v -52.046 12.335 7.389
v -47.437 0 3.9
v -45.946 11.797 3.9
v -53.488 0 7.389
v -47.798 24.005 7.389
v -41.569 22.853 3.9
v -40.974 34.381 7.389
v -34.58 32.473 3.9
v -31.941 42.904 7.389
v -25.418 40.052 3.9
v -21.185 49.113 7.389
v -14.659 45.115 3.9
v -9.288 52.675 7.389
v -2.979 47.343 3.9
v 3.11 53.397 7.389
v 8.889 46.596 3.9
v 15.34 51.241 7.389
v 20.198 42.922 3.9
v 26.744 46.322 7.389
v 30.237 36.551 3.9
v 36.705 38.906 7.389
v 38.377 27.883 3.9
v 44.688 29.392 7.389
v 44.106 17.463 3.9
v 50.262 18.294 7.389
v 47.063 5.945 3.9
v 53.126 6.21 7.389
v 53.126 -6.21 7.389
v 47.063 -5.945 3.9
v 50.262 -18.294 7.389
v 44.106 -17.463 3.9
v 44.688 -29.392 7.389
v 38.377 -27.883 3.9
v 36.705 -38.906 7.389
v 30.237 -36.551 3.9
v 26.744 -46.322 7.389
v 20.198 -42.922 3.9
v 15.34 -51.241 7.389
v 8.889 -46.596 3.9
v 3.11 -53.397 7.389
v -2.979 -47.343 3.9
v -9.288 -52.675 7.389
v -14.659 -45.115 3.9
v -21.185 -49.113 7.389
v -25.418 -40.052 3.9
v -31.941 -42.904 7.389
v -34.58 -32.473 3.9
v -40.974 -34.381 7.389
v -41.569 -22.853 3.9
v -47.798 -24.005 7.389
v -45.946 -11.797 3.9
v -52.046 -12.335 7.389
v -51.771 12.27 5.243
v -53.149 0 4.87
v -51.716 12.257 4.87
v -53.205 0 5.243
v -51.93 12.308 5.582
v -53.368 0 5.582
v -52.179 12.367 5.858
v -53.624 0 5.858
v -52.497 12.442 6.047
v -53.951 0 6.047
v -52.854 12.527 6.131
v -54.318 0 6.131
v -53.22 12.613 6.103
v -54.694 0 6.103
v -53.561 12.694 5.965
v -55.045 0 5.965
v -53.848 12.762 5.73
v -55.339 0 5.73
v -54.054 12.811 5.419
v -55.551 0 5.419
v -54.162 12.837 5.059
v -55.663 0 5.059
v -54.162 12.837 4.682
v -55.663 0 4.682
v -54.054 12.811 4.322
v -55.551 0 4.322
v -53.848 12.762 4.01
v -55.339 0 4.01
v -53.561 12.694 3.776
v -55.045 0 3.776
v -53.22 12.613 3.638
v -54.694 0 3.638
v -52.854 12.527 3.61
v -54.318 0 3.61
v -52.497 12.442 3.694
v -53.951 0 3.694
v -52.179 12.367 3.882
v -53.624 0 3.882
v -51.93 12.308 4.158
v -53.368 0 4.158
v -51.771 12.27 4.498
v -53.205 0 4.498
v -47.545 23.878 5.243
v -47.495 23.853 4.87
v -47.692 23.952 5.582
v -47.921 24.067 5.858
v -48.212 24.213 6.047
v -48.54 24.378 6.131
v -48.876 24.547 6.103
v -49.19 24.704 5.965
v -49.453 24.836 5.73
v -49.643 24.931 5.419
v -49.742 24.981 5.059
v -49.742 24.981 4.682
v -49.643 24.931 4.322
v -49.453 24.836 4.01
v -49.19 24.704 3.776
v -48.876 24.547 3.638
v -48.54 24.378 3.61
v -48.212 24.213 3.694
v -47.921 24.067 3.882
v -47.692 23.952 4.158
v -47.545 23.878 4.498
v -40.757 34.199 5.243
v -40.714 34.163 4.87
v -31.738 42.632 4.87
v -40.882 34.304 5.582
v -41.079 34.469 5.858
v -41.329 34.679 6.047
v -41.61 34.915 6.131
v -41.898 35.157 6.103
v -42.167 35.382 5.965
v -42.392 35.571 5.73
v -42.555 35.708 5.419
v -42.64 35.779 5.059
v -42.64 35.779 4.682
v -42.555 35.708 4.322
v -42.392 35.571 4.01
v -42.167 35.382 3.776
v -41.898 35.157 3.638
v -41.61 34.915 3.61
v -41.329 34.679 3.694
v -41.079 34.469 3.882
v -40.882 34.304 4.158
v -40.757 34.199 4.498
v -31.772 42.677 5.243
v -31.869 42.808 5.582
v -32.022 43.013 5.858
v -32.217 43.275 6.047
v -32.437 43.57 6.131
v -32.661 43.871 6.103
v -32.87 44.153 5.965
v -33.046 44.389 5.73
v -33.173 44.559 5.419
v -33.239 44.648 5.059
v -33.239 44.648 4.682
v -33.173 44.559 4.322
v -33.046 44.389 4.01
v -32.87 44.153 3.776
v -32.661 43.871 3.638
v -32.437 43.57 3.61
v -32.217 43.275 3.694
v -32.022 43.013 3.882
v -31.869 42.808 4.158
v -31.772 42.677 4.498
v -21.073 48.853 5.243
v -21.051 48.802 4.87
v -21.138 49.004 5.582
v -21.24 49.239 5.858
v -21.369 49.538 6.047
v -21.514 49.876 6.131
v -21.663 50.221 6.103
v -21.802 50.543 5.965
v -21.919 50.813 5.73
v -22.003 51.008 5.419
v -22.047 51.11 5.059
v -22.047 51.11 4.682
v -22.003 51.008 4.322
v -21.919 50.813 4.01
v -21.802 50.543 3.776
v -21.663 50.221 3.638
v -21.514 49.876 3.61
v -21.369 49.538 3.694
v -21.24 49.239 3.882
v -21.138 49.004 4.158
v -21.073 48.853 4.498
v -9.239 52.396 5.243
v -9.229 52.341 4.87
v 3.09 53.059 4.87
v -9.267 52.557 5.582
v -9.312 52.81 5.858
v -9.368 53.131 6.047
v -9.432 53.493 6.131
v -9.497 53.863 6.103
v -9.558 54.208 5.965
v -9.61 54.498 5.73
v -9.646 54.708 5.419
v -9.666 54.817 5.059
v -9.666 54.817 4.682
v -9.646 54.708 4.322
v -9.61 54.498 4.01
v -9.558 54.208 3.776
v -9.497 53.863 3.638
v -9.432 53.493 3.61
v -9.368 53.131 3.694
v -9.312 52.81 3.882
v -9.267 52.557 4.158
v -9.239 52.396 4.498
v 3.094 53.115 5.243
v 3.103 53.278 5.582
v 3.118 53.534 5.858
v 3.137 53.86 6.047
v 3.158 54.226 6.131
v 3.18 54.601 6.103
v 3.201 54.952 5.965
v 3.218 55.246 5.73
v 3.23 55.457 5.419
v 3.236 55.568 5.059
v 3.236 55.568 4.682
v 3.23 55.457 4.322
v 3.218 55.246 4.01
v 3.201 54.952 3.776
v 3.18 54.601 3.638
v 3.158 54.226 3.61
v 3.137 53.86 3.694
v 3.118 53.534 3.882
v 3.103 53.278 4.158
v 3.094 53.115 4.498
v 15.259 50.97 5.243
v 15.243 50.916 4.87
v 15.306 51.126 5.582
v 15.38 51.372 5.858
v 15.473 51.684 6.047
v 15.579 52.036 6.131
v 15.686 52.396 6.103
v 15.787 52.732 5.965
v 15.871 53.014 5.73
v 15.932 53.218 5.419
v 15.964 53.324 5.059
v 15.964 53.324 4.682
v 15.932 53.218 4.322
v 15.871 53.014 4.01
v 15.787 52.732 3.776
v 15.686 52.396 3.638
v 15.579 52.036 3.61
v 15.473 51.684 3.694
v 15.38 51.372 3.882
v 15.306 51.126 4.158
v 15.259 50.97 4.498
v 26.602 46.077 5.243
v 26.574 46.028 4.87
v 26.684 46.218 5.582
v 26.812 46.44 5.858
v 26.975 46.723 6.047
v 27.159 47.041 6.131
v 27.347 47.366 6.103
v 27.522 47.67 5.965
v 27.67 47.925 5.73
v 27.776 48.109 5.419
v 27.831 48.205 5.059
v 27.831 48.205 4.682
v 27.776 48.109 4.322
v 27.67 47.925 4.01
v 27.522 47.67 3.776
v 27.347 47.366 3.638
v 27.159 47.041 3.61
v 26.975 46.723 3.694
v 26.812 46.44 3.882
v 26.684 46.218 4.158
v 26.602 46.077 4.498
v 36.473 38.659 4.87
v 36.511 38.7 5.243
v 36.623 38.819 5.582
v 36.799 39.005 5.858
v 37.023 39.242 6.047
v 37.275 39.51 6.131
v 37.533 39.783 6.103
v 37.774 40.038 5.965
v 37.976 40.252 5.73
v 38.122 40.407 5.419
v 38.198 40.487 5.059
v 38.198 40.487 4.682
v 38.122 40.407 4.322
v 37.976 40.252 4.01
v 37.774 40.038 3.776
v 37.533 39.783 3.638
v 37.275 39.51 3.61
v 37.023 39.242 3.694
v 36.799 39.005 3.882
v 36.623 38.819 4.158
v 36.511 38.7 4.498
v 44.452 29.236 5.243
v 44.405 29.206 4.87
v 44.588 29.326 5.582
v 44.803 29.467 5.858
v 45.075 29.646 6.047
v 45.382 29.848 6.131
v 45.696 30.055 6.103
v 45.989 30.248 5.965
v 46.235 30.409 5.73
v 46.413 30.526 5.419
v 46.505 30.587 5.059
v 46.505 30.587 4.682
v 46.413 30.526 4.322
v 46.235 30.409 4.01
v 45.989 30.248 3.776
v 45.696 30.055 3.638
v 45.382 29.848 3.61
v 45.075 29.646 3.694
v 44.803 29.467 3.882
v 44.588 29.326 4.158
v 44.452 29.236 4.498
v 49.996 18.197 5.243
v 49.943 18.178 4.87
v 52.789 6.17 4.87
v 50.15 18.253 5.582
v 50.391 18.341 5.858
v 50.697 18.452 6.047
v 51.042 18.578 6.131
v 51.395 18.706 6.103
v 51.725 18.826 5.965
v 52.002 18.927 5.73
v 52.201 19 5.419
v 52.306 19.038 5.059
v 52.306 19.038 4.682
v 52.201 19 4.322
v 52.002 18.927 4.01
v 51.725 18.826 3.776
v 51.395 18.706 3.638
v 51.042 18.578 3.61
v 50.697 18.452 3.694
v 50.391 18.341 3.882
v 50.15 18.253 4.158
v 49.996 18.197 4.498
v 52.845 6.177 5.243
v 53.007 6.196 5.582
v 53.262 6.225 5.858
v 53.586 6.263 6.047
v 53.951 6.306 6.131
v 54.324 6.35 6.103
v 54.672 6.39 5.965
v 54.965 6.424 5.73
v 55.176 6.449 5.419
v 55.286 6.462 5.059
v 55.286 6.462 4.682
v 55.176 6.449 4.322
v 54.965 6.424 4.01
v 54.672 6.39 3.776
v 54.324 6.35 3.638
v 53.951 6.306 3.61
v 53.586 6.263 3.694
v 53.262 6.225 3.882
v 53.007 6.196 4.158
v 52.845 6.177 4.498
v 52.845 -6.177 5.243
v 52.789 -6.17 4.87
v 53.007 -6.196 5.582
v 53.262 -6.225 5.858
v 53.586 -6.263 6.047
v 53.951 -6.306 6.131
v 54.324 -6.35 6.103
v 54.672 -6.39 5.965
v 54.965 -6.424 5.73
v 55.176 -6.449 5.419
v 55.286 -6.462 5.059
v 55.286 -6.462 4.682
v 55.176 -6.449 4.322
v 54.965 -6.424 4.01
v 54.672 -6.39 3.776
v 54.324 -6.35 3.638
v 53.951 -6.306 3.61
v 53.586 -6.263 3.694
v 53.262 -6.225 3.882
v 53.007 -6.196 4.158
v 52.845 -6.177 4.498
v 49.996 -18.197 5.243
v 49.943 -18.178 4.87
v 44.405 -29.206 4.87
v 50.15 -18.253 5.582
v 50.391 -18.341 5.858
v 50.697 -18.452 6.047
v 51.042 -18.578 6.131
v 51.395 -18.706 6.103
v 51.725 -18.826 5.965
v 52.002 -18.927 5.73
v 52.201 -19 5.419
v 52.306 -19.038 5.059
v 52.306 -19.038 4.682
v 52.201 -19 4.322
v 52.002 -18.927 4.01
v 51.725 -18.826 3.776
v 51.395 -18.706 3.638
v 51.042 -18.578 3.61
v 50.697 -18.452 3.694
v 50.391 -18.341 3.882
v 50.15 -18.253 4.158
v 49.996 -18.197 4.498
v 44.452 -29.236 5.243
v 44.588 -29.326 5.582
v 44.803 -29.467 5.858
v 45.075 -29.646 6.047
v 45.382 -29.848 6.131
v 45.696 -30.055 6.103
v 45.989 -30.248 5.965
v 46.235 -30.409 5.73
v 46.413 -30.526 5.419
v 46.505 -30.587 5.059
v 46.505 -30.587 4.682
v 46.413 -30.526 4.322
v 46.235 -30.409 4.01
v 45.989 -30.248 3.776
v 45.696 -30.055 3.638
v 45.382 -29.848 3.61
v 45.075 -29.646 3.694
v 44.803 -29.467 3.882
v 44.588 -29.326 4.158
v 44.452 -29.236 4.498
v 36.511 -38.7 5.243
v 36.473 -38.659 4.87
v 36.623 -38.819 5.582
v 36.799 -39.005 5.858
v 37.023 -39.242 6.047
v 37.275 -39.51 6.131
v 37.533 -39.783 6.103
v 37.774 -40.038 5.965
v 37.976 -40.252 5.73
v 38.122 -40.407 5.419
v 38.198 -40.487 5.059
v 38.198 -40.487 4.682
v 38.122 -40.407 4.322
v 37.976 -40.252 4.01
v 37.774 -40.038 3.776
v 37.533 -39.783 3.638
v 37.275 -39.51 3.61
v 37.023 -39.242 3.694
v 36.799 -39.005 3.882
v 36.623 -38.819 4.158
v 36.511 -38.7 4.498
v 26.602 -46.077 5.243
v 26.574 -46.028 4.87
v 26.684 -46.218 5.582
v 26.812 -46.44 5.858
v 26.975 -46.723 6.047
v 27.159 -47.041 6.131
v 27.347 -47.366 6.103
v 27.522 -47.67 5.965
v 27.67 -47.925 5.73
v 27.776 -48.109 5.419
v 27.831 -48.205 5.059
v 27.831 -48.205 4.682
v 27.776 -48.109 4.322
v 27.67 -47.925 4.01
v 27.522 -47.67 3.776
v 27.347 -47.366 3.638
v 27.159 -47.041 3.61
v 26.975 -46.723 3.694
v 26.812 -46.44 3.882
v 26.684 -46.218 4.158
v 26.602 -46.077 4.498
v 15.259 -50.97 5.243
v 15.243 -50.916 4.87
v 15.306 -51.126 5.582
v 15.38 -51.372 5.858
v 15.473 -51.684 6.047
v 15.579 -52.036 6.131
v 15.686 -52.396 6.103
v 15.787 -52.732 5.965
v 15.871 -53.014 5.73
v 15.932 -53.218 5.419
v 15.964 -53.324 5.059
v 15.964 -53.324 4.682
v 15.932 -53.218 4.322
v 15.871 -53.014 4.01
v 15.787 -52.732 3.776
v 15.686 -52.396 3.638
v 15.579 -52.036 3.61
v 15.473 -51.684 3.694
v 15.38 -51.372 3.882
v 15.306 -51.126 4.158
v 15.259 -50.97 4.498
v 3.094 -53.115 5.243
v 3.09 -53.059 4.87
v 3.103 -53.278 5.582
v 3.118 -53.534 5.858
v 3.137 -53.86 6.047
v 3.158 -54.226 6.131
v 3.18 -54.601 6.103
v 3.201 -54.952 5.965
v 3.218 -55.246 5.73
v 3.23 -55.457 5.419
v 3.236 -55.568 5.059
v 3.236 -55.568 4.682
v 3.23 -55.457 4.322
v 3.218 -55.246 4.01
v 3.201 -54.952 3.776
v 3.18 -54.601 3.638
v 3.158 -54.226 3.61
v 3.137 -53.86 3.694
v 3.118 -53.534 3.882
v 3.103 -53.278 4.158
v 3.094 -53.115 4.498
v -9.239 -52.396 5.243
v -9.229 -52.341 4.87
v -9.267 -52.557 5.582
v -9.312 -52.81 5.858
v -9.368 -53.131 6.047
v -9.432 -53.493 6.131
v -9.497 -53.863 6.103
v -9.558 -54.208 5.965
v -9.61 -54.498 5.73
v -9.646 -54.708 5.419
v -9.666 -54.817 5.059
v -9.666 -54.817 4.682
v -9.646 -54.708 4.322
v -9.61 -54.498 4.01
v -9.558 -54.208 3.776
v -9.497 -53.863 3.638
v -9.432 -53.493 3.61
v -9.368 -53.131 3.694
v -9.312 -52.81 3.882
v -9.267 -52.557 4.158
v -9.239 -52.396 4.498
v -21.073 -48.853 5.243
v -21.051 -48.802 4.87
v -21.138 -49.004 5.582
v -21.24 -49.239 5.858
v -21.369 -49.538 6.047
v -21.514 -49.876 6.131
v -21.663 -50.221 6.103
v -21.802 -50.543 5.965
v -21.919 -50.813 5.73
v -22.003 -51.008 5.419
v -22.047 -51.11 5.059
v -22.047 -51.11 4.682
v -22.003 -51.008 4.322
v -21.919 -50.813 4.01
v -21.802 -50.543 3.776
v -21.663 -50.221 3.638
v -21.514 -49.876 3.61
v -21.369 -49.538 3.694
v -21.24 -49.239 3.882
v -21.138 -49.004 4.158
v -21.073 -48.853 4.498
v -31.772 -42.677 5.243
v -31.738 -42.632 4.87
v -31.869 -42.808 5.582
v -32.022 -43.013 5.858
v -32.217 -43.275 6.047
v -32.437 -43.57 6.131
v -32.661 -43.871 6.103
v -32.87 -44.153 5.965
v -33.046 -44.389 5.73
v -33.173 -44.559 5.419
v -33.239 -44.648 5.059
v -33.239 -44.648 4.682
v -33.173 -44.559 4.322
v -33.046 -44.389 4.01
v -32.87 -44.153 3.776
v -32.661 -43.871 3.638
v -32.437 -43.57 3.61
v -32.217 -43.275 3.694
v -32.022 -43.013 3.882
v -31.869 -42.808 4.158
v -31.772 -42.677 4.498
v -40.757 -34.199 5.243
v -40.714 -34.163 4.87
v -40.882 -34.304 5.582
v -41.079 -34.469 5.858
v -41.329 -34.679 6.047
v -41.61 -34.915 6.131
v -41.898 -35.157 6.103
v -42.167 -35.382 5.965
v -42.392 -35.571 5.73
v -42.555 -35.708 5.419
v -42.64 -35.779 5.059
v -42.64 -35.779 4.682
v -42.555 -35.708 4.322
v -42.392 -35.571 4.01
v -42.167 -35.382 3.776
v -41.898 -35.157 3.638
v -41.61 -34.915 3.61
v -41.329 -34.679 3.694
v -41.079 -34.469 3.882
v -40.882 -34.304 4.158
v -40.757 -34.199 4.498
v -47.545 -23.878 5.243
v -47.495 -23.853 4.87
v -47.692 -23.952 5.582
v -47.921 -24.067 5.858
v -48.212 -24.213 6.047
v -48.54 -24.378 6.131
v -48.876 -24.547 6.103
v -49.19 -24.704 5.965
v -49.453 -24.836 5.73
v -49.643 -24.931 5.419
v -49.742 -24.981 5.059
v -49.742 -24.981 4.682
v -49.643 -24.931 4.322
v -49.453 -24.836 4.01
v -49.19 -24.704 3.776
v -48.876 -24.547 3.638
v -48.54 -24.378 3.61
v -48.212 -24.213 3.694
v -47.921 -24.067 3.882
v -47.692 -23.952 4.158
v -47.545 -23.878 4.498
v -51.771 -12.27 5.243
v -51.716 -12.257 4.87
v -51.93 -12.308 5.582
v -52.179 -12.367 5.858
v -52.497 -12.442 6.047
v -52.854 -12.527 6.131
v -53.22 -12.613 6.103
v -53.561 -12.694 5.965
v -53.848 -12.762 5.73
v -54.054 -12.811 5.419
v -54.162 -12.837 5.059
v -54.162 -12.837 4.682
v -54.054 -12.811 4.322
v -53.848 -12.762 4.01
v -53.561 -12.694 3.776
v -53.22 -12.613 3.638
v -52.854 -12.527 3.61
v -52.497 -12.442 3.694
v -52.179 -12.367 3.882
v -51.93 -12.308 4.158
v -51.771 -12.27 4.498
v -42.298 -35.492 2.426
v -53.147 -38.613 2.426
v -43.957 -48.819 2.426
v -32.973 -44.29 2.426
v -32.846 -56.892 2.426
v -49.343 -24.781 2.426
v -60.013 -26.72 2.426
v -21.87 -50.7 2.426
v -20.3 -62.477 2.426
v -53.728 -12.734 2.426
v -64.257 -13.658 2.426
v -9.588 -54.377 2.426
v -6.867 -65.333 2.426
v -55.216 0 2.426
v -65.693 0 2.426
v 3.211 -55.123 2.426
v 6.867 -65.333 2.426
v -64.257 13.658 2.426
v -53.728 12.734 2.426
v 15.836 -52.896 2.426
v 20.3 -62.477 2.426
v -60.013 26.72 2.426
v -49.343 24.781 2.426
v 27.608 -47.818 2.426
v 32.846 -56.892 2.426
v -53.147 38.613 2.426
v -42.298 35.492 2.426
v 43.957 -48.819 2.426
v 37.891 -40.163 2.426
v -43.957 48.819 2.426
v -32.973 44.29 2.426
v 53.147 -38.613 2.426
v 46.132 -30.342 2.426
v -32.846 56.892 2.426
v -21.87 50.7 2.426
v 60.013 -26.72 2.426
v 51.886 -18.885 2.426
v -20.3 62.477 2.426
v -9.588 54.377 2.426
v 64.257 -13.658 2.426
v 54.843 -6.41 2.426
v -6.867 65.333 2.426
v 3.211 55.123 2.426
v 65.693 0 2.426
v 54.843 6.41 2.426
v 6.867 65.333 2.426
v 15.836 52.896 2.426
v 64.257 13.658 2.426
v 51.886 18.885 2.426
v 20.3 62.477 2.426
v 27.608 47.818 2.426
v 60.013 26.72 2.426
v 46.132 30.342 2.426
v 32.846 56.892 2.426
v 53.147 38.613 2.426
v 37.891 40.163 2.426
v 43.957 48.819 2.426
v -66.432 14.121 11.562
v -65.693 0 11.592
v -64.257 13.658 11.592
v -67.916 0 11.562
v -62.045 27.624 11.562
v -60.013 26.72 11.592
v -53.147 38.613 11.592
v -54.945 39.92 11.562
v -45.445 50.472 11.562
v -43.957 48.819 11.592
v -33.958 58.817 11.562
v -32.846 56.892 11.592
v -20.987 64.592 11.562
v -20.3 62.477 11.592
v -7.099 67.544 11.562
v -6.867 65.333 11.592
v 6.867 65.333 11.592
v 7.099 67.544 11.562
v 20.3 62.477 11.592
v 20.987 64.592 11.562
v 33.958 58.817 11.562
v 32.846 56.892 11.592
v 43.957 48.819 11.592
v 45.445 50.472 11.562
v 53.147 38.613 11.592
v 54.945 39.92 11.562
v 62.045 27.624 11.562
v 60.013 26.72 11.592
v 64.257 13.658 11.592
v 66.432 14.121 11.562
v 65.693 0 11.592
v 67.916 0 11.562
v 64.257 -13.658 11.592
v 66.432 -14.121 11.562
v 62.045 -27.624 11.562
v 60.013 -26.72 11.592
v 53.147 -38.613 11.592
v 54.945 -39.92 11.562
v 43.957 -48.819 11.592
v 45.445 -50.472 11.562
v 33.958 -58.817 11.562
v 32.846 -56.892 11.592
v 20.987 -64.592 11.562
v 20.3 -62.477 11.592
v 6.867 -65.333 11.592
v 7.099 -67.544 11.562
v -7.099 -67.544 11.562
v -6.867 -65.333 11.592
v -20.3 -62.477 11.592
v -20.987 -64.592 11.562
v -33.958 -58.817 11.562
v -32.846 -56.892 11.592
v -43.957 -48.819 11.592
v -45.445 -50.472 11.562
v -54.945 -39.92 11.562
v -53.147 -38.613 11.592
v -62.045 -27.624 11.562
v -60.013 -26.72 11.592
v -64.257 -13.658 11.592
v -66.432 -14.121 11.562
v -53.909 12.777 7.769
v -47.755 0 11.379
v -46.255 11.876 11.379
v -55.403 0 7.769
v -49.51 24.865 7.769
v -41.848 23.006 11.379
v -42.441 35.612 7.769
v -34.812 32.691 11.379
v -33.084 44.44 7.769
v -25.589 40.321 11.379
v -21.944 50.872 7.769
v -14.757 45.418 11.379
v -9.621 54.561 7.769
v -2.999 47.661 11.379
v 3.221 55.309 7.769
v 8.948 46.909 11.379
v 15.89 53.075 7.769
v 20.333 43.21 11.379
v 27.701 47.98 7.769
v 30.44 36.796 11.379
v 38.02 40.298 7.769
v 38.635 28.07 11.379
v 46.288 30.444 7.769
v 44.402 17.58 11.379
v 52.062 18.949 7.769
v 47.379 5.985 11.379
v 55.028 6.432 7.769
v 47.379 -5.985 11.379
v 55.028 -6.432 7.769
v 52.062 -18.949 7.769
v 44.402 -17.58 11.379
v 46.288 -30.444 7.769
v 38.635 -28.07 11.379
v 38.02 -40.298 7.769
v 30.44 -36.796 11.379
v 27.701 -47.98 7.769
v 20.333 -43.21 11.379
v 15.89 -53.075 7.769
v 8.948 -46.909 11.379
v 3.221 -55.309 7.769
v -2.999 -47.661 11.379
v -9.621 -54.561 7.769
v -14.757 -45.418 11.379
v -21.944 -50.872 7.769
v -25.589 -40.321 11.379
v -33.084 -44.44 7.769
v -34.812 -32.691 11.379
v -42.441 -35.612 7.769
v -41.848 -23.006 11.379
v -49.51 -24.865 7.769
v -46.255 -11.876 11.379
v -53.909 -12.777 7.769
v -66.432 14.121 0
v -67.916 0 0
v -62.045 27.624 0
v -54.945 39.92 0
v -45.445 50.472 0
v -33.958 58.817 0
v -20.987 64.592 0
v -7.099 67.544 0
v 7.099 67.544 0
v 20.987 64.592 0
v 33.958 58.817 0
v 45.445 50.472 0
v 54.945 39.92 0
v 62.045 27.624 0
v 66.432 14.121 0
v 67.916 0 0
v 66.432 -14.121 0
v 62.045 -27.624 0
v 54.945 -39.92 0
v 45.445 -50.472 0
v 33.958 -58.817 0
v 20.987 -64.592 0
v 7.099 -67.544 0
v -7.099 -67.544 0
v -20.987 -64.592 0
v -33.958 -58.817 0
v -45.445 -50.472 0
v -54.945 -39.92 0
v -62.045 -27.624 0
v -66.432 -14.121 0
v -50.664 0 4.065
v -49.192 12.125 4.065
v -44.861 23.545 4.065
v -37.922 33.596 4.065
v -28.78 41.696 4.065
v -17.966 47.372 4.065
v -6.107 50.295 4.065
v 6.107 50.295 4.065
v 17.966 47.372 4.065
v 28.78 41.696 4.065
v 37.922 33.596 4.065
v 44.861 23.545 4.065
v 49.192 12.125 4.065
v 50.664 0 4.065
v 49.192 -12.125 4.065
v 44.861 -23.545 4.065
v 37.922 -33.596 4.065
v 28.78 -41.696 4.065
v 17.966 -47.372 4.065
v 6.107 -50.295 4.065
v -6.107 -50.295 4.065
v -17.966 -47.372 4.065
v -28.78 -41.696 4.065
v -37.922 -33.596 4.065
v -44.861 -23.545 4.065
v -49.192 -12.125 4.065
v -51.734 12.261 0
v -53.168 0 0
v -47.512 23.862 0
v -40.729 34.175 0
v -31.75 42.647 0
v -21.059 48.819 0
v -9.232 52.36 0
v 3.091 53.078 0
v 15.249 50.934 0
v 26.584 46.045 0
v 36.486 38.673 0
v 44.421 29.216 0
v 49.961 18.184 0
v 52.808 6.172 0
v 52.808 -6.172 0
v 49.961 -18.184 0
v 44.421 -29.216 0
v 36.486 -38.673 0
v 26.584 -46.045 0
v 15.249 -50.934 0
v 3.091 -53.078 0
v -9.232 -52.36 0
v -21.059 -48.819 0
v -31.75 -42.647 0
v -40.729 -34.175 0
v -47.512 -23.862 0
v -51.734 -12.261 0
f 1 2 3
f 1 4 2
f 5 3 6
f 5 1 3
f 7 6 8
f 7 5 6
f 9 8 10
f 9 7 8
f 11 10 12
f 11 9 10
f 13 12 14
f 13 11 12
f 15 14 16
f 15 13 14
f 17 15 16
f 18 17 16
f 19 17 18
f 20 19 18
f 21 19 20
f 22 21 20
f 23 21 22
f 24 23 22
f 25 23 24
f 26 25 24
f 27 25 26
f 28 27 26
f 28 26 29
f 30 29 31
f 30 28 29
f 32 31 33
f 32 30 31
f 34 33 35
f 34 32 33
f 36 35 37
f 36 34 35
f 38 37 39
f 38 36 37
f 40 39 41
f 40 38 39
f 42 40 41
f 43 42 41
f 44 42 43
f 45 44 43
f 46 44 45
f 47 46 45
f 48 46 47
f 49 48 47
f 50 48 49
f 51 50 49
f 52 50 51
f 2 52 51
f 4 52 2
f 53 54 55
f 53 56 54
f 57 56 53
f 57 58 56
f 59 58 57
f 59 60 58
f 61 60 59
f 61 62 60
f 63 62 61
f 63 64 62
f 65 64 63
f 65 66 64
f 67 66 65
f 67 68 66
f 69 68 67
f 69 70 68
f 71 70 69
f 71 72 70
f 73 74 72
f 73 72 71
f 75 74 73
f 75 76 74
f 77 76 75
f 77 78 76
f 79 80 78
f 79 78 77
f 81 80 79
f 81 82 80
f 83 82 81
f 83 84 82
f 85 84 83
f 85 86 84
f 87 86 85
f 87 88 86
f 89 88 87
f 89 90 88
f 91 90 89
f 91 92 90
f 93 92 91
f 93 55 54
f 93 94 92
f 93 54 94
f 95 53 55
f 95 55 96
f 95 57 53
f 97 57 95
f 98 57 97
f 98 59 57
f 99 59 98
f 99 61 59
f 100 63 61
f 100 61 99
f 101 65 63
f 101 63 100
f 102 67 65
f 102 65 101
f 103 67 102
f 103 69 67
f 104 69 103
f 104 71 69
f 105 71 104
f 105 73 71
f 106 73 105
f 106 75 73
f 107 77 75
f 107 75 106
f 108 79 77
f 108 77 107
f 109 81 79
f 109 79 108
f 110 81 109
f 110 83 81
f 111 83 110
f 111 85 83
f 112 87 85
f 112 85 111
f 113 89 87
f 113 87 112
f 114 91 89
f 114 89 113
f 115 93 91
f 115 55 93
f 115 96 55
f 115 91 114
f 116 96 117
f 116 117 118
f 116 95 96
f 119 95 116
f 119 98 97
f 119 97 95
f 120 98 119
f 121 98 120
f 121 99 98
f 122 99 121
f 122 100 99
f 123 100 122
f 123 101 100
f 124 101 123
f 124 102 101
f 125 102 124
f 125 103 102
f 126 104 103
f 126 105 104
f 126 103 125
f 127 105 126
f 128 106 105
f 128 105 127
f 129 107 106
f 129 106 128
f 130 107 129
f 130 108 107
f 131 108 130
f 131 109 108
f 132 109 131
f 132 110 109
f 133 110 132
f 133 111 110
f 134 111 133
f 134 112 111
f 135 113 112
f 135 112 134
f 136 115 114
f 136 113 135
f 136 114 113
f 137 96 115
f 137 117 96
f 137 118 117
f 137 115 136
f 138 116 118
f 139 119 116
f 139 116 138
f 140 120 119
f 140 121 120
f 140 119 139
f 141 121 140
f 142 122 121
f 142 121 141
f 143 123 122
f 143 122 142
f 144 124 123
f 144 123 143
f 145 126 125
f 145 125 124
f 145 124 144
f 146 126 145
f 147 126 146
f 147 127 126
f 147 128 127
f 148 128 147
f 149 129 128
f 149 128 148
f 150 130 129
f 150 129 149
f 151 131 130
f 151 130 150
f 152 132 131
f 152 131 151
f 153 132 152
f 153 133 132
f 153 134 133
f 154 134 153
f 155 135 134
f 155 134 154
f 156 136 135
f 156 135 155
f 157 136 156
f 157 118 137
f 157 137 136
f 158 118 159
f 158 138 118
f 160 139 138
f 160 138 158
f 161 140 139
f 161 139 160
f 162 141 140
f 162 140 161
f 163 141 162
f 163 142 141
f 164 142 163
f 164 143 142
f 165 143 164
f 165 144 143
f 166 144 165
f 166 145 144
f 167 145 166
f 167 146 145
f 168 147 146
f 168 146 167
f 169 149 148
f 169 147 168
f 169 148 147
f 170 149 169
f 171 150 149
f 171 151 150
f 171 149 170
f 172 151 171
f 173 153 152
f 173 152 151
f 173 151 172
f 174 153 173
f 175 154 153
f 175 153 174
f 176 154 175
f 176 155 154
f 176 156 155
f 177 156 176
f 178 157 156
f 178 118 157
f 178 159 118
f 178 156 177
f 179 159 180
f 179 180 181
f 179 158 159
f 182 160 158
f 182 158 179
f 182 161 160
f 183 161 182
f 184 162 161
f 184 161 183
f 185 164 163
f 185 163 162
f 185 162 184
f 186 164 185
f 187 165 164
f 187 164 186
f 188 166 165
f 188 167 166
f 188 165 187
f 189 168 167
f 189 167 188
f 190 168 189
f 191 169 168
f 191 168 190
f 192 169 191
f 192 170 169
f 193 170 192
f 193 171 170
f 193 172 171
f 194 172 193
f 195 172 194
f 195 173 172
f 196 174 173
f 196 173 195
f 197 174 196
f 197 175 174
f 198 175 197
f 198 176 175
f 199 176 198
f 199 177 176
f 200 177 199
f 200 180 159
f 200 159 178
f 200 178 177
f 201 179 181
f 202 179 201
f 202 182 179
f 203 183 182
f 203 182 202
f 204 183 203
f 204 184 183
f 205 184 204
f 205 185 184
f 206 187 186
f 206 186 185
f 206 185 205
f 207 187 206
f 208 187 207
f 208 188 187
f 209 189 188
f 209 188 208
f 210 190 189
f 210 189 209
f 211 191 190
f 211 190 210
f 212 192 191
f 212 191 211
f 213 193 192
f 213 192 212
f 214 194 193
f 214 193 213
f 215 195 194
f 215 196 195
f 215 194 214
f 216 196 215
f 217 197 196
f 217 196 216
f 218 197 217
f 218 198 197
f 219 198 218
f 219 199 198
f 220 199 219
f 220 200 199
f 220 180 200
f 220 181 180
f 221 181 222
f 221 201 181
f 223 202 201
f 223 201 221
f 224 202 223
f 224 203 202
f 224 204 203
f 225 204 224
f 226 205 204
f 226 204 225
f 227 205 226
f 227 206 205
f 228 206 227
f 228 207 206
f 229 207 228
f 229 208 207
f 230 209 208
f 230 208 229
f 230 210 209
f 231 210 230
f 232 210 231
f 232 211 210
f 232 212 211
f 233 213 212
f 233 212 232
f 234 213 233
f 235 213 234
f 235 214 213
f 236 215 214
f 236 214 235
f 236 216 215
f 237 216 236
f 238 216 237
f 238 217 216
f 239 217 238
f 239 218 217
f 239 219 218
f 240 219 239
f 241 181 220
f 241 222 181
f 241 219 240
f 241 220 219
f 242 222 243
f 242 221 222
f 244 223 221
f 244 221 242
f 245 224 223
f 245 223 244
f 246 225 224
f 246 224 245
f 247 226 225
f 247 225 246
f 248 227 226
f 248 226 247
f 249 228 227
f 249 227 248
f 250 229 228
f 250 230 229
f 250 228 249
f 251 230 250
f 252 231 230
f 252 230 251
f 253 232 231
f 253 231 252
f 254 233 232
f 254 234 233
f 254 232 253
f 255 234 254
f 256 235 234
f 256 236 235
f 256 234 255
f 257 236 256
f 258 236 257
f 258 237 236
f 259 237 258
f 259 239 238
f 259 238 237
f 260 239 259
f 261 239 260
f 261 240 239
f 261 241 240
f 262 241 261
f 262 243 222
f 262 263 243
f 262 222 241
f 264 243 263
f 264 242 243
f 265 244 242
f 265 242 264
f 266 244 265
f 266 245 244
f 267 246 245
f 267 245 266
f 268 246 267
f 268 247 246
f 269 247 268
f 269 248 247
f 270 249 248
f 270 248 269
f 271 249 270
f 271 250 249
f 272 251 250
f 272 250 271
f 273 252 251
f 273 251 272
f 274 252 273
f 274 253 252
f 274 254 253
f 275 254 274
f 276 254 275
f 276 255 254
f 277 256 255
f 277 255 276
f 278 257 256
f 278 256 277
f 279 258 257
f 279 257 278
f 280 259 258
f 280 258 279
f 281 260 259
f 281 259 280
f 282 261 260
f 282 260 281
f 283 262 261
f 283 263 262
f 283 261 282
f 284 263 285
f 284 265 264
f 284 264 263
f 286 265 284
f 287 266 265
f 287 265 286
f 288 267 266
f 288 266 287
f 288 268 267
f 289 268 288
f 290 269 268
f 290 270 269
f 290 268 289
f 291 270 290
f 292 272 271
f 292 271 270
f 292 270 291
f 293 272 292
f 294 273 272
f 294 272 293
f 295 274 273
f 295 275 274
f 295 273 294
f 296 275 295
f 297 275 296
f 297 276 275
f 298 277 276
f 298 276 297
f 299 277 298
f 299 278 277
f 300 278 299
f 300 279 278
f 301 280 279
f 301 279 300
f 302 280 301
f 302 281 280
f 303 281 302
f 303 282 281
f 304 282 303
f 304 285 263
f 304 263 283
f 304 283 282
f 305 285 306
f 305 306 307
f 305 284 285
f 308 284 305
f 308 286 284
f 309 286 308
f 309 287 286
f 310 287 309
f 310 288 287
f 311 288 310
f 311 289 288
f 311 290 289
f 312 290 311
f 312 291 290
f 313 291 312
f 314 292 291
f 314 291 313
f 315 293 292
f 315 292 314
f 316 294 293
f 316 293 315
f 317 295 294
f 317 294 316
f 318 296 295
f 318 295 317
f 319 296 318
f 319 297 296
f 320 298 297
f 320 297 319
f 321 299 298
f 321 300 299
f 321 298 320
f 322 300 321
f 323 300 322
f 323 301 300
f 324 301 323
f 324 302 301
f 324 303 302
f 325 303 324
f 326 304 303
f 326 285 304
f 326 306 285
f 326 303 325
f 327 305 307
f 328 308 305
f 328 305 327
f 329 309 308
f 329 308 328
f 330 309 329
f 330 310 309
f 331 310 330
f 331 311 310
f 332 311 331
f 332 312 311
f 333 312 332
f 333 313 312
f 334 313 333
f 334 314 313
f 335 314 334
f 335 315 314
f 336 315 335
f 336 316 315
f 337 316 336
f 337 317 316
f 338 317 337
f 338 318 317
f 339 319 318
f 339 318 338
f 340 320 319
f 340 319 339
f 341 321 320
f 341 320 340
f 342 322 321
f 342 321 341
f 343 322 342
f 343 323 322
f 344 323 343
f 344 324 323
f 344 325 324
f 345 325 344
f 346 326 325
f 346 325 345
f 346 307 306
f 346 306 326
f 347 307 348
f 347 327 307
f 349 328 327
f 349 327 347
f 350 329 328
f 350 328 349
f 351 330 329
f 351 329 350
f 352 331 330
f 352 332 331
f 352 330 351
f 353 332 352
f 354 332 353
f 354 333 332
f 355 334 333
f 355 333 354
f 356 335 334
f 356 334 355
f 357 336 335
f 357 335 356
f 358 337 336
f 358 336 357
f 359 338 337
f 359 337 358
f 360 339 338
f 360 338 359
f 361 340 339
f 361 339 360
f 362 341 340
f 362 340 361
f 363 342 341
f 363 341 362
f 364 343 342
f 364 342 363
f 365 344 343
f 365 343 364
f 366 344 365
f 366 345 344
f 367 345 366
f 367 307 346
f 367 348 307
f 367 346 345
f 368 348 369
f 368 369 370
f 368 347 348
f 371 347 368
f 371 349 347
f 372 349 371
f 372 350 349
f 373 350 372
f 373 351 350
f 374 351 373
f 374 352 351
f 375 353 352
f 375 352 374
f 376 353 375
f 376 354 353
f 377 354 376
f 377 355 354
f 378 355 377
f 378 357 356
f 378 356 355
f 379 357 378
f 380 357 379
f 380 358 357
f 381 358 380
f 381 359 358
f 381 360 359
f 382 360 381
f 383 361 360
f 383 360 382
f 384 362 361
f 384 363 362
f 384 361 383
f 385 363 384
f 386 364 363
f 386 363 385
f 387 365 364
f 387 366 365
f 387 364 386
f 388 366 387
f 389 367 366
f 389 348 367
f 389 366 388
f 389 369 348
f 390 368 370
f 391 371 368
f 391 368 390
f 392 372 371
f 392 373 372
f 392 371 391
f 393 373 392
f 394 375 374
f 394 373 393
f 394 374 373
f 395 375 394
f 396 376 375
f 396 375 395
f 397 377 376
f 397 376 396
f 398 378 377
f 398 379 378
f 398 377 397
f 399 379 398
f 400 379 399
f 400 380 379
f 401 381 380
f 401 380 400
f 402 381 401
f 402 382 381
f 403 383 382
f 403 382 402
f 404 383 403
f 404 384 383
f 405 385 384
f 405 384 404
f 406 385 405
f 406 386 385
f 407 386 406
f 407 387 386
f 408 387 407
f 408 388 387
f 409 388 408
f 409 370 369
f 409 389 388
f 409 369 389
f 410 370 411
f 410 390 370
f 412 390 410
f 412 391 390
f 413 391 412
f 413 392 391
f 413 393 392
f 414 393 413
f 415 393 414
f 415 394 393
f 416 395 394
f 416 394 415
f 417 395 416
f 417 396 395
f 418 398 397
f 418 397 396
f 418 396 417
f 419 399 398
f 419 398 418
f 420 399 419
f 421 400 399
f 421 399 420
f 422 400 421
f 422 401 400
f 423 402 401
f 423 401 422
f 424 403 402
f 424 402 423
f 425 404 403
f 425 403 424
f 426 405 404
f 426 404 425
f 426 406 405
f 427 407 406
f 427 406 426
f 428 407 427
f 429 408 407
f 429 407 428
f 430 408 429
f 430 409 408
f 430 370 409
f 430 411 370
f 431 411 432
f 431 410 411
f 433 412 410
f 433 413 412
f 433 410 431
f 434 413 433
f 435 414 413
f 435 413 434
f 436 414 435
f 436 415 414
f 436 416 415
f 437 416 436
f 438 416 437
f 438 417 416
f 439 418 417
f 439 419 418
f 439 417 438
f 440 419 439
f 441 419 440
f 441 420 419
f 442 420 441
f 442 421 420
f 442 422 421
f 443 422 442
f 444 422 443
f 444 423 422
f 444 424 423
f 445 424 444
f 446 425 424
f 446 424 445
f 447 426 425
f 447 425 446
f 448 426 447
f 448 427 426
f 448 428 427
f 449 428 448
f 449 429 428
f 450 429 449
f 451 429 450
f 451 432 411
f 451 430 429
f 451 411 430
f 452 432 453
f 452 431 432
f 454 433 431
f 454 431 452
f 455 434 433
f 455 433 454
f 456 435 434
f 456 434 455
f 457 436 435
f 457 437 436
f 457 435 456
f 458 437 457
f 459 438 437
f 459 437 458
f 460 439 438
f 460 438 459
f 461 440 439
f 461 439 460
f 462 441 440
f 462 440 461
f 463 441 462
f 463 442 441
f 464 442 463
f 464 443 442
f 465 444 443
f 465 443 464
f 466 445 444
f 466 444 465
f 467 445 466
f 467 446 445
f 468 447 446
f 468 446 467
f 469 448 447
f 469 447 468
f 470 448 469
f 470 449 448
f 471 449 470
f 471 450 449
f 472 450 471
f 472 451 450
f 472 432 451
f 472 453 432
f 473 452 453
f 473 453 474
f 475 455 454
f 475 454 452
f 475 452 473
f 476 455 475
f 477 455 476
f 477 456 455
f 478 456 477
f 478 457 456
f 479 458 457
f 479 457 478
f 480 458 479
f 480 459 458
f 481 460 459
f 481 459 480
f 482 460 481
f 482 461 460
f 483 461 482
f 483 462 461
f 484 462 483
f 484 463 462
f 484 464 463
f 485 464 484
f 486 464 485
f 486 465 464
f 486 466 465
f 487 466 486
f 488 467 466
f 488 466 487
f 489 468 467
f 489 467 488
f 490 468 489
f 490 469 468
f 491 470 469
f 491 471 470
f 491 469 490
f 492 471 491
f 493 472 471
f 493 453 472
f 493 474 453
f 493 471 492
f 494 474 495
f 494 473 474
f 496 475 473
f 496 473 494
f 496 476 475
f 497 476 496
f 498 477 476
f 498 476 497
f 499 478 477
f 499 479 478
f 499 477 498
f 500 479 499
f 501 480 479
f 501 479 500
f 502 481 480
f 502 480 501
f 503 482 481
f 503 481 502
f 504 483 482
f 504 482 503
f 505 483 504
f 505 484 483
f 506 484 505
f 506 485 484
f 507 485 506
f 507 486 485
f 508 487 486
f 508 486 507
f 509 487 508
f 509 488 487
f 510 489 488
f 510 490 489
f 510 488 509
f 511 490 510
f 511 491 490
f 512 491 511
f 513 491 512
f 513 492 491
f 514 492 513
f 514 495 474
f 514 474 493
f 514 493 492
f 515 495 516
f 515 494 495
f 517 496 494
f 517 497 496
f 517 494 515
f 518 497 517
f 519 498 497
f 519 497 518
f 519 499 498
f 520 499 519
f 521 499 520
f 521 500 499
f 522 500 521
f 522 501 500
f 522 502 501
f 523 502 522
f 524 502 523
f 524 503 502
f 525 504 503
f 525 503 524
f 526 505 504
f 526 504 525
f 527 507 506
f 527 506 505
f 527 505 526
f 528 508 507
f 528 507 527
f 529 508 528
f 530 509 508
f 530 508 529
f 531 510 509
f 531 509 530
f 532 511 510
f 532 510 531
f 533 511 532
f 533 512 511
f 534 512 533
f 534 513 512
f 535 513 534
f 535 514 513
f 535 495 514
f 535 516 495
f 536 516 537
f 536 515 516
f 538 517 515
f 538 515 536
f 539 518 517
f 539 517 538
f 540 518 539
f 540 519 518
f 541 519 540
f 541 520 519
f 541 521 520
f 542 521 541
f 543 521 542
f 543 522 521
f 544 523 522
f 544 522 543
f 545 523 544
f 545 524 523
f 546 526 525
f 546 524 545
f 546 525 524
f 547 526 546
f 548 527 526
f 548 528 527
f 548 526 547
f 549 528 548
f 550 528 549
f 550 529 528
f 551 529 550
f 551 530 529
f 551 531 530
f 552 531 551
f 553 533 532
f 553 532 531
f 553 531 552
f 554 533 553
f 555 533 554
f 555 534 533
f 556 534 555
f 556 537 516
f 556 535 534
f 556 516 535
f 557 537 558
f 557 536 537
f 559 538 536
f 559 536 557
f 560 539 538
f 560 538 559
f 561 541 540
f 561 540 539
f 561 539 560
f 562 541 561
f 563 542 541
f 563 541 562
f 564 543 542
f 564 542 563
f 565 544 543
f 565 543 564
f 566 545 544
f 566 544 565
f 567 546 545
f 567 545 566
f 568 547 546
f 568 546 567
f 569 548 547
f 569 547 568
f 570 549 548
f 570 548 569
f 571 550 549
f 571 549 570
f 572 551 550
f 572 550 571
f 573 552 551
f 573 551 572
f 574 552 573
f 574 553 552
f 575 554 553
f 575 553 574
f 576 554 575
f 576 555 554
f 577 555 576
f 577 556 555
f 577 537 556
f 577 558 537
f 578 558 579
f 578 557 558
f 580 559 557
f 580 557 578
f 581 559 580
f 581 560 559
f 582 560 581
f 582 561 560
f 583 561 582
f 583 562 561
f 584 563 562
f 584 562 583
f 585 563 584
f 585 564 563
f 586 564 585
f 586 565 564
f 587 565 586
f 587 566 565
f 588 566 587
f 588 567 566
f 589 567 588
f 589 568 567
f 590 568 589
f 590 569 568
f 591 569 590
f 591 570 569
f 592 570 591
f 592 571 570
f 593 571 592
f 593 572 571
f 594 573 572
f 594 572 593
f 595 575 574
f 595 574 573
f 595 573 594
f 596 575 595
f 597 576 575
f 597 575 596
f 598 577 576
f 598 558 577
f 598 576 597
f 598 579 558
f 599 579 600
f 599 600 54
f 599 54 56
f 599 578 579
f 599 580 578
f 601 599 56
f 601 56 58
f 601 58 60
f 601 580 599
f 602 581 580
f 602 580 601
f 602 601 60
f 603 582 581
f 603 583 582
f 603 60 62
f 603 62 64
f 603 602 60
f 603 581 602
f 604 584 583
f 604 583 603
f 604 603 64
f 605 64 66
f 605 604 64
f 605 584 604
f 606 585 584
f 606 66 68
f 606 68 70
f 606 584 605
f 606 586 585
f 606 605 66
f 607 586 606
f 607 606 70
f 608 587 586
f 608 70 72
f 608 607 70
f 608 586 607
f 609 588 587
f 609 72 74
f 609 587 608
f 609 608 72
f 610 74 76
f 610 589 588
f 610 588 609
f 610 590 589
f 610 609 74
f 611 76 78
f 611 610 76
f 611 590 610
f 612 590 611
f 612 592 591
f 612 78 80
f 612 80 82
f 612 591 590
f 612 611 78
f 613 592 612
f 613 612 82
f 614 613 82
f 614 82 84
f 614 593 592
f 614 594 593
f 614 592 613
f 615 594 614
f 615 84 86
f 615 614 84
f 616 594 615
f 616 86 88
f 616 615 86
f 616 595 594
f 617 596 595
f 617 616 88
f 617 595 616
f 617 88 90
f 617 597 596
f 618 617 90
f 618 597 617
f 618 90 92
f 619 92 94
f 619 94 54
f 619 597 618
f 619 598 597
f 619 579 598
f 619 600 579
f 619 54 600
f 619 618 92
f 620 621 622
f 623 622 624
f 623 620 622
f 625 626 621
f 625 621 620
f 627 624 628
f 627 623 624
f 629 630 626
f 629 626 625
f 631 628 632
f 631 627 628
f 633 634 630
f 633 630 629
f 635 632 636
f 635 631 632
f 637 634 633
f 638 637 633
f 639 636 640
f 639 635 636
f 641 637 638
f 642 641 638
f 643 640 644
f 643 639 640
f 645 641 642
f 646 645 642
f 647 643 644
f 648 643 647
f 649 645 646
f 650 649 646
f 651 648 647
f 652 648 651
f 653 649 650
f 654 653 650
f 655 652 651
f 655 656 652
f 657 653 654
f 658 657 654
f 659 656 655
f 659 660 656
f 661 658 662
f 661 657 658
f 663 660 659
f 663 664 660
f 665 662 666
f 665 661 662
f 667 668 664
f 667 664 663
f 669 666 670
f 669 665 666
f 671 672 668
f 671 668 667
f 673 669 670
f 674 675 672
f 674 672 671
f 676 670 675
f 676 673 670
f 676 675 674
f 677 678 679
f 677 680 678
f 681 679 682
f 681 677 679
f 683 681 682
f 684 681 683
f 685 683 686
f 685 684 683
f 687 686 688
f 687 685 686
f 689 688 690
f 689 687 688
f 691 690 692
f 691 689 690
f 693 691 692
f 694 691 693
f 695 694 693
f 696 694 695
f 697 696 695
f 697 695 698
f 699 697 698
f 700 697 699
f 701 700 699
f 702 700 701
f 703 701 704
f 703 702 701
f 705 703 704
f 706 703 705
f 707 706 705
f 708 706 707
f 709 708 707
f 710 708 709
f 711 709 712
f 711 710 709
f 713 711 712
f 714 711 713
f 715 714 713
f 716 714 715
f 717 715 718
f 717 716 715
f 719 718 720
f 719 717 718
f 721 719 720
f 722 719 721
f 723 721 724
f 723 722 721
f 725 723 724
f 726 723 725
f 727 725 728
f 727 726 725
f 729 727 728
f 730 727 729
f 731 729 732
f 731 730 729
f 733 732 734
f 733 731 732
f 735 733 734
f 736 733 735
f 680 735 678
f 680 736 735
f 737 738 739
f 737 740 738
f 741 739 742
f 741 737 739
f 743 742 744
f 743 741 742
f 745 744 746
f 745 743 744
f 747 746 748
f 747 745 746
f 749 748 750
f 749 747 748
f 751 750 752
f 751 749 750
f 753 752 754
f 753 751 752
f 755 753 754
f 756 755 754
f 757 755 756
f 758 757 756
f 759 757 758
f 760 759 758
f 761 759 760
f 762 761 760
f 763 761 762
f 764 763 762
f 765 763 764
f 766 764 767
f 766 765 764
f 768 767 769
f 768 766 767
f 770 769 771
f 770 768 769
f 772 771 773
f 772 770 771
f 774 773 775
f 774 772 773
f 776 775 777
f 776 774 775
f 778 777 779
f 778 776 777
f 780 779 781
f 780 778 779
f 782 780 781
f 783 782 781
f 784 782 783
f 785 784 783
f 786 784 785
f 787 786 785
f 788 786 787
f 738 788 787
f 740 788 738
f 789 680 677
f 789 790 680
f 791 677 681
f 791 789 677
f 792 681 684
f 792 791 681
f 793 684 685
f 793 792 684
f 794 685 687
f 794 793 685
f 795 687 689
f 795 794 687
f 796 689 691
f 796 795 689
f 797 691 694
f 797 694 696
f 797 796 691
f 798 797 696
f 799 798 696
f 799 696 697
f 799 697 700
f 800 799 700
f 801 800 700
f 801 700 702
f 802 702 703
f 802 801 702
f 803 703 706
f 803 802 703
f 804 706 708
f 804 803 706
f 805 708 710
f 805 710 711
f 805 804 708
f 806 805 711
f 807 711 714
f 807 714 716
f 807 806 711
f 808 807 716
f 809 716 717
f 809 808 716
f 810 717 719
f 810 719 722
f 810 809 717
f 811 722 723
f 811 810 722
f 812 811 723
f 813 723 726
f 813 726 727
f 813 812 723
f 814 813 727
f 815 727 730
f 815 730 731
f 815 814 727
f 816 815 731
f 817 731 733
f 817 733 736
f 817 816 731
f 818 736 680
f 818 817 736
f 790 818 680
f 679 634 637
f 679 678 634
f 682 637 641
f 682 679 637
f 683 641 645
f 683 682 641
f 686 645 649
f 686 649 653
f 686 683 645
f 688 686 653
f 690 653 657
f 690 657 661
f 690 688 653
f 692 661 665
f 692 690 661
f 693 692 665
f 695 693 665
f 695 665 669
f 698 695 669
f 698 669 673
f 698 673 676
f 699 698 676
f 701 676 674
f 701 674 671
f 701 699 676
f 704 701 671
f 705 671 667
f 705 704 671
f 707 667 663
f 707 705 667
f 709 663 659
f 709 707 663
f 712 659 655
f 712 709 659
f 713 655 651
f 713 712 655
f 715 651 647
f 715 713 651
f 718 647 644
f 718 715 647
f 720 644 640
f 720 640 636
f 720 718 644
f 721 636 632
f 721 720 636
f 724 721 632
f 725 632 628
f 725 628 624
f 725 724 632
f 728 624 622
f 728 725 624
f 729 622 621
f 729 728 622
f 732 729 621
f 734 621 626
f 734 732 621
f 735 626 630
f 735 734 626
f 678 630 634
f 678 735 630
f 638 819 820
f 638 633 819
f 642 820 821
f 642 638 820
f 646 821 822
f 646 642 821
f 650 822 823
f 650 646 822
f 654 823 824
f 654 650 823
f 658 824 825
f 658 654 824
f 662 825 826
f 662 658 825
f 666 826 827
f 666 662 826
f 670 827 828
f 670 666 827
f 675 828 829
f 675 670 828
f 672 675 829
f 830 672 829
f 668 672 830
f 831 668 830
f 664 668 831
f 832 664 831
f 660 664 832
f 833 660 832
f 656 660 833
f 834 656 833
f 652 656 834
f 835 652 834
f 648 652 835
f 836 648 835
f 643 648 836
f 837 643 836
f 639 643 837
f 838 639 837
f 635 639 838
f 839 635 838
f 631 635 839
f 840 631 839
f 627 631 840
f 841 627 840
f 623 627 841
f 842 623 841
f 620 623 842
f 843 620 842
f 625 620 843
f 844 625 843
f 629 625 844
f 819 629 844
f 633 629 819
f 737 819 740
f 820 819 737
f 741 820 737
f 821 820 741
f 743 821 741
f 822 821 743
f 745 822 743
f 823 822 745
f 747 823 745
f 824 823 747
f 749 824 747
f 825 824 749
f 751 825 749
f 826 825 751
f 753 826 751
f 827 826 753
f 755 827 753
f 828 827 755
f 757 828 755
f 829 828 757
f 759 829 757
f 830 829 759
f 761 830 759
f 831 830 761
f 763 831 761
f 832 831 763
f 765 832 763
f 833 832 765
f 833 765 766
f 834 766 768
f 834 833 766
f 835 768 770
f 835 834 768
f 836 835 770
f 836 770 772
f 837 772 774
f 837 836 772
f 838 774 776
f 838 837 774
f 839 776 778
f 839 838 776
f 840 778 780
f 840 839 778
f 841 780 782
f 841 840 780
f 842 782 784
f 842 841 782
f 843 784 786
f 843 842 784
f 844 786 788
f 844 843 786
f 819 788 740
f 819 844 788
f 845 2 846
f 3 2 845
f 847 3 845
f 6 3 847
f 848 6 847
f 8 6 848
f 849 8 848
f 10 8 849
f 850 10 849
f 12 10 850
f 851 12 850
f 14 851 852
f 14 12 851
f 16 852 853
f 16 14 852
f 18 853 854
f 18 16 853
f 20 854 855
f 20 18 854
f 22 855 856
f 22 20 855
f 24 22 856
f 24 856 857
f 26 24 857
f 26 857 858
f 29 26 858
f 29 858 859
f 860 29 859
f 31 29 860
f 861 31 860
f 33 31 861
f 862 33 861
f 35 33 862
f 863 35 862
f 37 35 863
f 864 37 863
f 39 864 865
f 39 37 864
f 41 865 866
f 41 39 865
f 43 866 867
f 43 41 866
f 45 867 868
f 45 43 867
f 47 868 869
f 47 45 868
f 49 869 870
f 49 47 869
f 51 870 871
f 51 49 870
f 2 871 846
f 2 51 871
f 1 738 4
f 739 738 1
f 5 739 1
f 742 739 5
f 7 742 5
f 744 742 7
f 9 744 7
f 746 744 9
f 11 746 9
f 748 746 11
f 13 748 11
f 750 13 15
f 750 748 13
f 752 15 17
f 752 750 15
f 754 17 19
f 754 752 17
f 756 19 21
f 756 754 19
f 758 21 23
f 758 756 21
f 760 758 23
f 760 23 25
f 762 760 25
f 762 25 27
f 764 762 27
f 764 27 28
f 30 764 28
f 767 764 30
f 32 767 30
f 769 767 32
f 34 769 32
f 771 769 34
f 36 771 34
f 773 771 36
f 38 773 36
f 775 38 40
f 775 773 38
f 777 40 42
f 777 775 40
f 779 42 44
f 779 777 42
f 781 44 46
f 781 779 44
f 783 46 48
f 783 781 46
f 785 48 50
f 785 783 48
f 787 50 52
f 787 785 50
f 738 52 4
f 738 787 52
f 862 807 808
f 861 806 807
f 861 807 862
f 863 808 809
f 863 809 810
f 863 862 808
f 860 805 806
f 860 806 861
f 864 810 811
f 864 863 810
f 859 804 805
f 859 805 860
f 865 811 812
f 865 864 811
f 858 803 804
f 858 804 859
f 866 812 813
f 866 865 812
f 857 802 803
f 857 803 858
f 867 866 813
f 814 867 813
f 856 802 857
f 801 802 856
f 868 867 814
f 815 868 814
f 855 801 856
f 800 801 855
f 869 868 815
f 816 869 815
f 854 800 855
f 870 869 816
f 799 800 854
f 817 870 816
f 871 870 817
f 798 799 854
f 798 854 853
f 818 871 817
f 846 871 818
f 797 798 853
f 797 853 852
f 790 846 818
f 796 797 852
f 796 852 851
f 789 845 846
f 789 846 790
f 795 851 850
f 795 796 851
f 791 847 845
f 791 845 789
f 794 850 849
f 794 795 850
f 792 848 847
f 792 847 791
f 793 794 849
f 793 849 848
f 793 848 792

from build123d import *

# Parameters (mm, degrees)
F0_R = 1.264042


with BuildPart() as f1:
    # F0 (on Front) → F1 (revolve)
    with BuildSketch(Plane.XZ):
        Polygon((-65.692723, 11.592387), (-67.916192, 11.56214), (-67.916192, 0), (-53.167634, 0), (-47.436673, 3.900215), (-53.487708, 7.388874), (-47.755232, 11.379424), (-55.402715, 7.769435), (-50.663935, 4.065192), (-55.215961, 2.426463), (-65.692723, 2.426463), align=None)
        with Locations((-54.412611, 4.870228)):
            Circle(F0_R)
    revolve(axis=Axis((0, 0, 11.062643), (0, 0, -1)))


solid = f1.part
